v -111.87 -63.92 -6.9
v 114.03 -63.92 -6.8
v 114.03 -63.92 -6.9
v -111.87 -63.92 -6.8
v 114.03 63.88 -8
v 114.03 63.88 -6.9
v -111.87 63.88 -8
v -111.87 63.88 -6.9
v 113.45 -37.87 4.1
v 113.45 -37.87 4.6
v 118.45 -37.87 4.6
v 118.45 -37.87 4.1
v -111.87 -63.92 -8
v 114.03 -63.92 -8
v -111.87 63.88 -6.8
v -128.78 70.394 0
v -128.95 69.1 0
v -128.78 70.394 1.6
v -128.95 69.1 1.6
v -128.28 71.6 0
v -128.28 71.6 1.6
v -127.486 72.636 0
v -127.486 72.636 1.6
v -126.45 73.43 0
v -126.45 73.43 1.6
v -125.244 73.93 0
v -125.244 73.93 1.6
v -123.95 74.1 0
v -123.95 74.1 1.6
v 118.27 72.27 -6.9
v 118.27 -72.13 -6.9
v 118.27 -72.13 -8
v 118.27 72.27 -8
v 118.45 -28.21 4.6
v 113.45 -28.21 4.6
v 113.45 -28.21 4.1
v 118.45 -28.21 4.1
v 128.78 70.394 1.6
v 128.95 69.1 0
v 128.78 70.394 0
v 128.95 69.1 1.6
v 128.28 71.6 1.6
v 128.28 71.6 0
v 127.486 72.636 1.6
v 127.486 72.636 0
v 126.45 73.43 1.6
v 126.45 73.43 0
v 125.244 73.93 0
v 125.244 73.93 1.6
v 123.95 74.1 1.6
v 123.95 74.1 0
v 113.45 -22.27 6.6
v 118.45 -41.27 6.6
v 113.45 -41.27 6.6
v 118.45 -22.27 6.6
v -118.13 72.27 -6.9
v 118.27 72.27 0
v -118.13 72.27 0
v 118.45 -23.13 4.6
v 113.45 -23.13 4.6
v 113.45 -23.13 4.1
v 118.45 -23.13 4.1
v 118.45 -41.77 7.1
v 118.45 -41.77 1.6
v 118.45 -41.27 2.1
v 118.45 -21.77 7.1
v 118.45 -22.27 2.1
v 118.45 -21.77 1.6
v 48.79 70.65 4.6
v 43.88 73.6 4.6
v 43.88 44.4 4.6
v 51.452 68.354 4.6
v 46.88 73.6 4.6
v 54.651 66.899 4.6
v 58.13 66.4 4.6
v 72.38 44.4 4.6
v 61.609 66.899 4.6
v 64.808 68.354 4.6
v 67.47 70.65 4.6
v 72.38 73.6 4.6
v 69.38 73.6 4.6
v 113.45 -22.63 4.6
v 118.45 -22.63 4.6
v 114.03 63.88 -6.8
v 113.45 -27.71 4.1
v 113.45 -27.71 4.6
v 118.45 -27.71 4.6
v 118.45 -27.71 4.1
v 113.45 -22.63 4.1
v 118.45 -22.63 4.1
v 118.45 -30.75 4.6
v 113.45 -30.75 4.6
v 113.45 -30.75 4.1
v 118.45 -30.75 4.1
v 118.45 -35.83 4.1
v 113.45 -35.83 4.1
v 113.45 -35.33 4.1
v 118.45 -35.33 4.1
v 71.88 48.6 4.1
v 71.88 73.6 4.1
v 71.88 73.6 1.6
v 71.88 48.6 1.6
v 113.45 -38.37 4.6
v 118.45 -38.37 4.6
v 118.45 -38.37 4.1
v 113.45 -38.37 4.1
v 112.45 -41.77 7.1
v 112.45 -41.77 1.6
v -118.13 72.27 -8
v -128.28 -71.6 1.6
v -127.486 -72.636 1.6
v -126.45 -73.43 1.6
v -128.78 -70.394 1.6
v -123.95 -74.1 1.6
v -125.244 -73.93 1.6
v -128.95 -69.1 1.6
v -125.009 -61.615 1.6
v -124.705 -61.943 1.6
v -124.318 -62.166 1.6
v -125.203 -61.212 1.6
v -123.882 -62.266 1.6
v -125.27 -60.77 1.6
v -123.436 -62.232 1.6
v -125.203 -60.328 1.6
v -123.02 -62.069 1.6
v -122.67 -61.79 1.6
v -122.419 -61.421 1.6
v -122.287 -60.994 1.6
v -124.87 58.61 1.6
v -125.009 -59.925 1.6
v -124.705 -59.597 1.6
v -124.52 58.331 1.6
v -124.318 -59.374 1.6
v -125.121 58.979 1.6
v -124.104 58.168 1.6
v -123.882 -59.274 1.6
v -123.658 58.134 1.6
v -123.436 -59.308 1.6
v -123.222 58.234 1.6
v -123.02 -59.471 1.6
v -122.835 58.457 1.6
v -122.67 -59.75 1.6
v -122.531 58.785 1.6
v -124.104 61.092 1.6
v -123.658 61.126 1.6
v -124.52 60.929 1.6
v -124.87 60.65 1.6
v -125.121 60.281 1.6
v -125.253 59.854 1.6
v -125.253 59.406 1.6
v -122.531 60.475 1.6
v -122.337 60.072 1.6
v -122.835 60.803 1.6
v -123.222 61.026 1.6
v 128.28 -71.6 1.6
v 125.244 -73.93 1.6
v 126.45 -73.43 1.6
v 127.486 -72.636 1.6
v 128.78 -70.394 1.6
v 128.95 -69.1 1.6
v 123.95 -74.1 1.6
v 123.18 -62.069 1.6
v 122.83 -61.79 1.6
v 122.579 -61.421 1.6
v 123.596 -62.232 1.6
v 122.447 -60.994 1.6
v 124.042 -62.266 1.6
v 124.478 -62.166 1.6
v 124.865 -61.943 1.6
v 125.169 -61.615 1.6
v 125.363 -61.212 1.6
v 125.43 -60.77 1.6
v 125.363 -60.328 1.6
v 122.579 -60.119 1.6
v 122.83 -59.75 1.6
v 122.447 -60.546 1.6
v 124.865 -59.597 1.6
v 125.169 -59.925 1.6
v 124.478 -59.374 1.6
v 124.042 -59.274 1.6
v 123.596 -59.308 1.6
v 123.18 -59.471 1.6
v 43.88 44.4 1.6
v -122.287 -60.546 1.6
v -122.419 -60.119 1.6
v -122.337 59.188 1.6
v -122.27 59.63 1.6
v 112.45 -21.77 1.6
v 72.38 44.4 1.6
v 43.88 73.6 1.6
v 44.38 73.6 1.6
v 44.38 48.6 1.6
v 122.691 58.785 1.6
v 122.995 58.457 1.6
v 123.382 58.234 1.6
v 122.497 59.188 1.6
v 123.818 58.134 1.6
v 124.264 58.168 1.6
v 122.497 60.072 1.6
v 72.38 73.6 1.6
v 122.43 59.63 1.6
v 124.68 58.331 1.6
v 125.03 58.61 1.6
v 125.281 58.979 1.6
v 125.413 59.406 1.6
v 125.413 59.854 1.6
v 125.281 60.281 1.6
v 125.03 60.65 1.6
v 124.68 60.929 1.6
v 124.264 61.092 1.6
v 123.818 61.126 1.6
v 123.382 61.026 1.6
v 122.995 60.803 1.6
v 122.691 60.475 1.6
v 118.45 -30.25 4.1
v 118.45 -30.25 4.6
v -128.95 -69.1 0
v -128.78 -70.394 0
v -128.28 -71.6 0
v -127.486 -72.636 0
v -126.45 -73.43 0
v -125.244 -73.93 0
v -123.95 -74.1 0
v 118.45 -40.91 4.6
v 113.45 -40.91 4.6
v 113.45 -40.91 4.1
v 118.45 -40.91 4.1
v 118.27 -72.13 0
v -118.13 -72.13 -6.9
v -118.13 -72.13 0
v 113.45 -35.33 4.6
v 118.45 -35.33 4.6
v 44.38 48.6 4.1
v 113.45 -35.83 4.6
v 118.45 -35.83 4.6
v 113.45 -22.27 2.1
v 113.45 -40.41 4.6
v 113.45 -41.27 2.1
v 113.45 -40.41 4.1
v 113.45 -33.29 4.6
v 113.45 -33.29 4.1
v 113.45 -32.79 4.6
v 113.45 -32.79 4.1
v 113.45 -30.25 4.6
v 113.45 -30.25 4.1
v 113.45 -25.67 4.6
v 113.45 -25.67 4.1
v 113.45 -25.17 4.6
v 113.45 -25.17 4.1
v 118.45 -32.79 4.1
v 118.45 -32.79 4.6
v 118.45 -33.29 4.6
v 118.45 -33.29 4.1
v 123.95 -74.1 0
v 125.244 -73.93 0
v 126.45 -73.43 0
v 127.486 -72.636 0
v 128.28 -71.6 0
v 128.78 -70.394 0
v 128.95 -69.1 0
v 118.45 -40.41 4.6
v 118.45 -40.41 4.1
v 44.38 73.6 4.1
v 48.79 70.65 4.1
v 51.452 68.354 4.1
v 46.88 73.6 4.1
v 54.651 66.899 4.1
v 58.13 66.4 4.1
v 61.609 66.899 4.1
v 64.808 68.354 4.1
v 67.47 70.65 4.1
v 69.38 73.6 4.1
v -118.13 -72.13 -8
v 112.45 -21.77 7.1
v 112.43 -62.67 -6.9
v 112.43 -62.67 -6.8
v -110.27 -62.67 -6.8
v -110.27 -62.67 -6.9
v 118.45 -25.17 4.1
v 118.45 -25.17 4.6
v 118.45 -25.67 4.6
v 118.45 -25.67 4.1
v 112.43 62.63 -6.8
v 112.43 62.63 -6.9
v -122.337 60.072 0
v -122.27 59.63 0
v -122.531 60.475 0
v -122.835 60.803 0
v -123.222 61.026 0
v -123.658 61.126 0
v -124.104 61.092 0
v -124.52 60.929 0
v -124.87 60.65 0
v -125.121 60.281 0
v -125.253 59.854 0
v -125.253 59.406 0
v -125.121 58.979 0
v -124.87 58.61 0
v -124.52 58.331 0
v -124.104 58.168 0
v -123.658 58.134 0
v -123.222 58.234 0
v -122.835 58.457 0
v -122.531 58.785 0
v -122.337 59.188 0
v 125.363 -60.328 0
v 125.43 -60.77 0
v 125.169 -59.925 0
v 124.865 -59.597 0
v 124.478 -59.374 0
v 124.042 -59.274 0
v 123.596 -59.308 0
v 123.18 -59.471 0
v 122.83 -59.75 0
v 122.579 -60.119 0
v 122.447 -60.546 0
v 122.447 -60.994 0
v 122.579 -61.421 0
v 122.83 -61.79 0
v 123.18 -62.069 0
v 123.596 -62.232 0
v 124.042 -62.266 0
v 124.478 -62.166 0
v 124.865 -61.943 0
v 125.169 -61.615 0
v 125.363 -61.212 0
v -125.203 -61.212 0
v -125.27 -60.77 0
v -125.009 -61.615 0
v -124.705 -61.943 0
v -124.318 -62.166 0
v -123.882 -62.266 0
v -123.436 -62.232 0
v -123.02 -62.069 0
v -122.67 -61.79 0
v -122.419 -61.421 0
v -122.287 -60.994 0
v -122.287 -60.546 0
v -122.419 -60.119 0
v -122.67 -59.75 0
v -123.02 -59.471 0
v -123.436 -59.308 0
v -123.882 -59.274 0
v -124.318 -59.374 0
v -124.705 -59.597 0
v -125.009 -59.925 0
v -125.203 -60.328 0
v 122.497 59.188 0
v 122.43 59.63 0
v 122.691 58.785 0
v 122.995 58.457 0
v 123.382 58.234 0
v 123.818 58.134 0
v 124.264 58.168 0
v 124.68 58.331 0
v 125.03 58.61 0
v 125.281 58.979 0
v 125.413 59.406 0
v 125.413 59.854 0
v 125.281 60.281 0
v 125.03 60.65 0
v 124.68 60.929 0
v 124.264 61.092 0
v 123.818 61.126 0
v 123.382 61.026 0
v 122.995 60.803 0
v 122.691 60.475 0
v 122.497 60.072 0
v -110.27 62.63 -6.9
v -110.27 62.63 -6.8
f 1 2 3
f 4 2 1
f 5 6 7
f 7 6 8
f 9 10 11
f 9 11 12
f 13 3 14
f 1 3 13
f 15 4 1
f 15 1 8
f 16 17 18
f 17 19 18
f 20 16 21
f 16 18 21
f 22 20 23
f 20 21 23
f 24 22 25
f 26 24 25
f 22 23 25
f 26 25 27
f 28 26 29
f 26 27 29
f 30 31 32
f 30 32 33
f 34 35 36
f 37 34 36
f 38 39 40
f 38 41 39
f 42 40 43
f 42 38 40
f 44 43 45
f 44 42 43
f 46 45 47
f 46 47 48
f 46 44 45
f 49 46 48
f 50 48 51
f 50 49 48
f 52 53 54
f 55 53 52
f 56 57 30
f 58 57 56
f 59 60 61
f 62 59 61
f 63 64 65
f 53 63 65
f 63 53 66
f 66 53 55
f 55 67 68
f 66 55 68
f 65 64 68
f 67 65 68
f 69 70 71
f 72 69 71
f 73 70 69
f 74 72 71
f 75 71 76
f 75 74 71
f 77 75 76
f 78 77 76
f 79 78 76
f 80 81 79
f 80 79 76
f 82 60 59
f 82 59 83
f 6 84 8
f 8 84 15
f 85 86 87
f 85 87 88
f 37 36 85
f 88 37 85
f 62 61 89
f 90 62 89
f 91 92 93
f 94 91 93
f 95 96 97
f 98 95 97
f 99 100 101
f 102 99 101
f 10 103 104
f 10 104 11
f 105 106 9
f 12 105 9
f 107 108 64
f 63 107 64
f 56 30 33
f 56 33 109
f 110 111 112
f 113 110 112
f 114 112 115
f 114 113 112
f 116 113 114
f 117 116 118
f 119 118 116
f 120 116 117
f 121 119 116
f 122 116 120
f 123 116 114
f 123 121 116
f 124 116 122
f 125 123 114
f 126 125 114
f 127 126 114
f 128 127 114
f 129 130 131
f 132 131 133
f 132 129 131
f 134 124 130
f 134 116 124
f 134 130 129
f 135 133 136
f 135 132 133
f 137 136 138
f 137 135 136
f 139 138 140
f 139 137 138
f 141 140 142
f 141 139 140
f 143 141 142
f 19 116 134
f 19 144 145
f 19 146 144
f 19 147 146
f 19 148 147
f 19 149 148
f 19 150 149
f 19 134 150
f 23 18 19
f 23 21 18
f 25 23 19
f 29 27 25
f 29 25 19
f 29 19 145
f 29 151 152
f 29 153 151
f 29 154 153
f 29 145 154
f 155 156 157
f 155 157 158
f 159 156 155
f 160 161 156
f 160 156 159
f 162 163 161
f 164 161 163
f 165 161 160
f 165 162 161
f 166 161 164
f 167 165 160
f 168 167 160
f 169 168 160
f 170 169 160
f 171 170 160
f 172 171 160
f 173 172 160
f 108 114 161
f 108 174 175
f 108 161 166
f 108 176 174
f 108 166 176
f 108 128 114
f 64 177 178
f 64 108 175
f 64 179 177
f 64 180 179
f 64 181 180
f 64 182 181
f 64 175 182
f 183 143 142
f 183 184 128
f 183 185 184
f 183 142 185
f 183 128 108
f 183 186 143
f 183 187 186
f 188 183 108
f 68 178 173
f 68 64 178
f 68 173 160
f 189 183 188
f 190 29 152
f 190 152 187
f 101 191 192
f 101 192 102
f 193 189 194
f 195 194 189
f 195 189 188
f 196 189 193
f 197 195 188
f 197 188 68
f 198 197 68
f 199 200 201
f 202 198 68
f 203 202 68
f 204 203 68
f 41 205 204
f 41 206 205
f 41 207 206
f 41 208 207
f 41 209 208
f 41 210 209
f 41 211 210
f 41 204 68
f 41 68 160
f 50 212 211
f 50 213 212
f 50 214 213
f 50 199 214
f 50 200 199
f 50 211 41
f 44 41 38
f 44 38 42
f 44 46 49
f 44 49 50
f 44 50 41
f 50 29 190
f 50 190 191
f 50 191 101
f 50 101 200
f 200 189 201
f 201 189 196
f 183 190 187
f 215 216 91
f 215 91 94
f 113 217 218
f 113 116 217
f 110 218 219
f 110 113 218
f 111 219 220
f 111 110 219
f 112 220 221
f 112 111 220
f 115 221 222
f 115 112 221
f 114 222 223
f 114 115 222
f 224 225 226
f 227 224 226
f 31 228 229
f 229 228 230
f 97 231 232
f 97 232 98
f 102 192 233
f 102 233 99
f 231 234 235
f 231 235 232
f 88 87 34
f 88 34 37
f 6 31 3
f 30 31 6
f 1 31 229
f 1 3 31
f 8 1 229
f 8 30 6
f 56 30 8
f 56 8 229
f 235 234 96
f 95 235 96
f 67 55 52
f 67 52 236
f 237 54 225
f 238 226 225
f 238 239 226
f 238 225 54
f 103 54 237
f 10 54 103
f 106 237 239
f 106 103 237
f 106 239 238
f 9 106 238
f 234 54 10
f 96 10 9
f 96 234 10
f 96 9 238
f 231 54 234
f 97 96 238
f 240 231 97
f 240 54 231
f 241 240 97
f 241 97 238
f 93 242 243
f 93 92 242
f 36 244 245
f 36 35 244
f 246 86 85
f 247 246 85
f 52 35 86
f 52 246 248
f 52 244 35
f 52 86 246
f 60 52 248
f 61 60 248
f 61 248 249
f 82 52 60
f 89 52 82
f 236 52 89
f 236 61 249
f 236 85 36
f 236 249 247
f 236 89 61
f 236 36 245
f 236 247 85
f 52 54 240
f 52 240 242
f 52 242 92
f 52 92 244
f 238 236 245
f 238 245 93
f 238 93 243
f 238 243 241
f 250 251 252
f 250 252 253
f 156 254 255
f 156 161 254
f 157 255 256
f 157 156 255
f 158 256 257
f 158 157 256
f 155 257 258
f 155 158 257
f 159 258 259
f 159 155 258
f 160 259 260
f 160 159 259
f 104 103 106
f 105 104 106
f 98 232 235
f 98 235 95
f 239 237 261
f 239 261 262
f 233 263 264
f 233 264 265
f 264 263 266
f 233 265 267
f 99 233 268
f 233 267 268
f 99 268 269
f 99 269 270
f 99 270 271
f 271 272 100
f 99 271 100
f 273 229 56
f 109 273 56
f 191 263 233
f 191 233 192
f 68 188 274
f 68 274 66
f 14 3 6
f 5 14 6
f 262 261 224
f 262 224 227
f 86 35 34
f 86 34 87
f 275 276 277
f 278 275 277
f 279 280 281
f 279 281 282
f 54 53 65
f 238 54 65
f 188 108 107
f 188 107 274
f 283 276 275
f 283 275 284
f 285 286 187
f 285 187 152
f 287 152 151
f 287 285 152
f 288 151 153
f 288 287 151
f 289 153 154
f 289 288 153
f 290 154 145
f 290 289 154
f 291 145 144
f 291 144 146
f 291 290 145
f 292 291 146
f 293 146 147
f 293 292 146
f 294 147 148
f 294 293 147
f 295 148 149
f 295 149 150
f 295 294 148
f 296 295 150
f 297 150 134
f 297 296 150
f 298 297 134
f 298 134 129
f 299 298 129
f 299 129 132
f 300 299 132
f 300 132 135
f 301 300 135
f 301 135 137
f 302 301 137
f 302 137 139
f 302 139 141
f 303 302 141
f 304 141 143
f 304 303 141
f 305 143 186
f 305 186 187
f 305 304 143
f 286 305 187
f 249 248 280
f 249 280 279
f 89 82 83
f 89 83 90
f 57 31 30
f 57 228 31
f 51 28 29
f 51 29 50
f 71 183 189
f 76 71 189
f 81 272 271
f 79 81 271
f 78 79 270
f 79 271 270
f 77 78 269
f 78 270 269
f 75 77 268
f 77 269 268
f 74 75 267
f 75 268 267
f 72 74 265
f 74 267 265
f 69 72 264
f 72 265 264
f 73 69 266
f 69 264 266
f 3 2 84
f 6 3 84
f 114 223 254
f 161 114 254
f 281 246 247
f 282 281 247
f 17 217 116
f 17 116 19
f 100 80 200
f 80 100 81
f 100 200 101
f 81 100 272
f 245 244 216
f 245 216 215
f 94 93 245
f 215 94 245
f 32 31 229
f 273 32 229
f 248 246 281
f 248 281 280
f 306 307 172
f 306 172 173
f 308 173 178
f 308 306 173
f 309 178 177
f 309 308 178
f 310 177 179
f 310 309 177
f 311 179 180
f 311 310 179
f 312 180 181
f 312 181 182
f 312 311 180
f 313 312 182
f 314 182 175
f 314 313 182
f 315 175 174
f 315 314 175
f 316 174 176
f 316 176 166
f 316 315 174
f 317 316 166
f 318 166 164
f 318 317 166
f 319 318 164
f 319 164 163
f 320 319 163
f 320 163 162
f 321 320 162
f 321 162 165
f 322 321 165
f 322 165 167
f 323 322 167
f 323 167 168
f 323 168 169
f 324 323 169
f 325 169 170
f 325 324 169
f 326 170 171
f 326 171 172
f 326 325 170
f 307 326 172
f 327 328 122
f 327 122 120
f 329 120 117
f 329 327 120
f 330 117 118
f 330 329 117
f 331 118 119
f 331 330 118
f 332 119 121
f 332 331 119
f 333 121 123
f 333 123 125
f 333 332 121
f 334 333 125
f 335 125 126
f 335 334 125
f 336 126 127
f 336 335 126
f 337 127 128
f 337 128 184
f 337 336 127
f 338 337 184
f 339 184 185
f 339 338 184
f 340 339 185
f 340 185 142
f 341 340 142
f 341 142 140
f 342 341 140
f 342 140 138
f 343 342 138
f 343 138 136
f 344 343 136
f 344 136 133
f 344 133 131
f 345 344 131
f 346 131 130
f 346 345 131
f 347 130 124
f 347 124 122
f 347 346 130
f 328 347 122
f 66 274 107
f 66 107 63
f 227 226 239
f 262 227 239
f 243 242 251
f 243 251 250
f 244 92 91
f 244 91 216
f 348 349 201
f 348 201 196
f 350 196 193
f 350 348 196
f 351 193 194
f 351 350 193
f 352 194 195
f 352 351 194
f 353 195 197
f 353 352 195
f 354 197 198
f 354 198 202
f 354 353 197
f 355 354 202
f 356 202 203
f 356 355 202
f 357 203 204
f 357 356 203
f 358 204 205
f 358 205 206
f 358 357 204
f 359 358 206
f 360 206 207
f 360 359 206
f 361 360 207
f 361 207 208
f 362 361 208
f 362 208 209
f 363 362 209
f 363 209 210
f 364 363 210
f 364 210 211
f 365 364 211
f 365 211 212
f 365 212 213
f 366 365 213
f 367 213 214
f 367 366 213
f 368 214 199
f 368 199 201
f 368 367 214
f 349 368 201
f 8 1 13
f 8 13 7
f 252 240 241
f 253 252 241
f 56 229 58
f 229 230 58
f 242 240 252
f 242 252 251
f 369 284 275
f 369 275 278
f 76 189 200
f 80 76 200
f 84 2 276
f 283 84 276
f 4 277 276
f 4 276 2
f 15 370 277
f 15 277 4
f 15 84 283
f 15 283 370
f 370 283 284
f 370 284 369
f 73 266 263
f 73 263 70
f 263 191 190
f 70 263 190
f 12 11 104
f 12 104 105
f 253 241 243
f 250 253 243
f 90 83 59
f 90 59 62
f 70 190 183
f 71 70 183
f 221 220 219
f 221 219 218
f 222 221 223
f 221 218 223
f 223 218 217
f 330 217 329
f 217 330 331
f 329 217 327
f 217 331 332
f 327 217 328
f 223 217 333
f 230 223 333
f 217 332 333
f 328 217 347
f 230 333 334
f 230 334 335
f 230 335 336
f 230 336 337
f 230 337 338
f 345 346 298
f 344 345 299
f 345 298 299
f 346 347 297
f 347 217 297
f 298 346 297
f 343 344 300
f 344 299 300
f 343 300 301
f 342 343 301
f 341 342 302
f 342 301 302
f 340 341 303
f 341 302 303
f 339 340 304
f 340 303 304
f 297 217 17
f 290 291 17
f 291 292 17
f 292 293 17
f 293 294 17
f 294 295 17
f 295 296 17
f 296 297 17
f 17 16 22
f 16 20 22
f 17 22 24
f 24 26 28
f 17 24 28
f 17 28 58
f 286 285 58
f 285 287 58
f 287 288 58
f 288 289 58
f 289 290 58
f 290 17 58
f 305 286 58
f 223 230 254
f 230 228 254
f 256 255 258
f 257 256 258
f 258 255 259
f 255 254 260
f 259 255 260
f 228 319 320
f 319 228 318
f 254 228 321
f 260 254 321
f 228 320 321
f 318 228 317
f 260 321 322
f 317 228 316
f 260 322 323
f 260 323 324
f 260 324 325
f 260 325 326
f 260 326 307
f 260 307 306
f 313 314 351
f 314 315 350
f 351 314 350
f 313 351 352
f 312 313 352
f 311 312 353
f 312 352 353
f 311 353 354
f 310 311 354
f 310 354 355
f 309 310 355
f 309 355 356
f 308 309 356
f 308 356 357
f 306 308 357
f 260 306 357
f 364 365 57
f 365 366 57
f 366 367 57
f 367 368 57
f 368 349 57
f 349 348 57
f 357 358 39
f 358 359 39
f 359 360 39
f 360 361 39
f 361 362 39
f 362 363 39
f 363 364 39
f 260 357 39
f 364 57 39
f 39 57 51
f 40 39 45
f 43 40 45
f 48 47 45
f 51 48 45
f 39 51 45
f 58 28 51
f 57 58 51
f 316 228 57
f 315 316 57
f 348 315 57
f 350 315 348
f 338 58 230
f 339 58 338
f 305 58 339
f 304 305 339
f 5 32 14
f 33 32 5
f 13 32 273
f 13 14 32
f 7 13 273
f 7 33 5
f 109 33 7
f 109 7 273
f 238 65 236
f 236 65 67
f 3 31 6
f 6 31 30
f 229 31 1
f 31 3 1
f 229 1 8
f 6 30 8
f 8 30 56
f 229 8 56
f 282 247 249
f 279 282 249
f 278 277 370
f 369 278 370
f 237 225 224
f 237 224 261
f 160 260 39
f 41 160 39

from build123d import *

# Parameters (mm, degrees)
SKETCH_1_W            = 257.9
SKETCH_1_H            = 148.2
EXTRUDE_1_DEPTH       = 1.6
FILLET_1_R            = 5
SKETCH_2_R            = 1.5
CUT_EXTRUDE_864_DEPTH = 1.6
SKETCH_3_W            = 236.4
SKETCH_3_H            = 144.4
EXTRUDE_1149_DEPTH    = 6.4
SKETCH_4_W            = 236.4
SKETCH_4_H            = 144.4
SKETCH_4_W_2          = 225.9
SKETCH_4_H_2          = 127.8
EXTRUDE_1442_DEPTH    = 0.5
SKETCH_5_W            = 222.7
SKETCH_5_H            = 125.3
EXTRUDE_1729_DEPTH    = 0.5
SKETCH_6_W            = 225.9
SKETCH_6_H            = 127.8
SKETCH_6_W_2          = 222.7
SKETCH_6_H_2          = 125.3
EXTRUDE_2020_DEPTH    = 0.4
SKETCH_7_W            = 6
SKETCH_7_H            = 20
EXTRUDE_4_DEPTH       = 5.5
SKETCH_8_W            = 4.5
SKETCH_8_H            = 19
CUT_EXTRUDE_1_DEPTH   = 5
SKETCH_9_W            = 0.5
SKETCH_9_H            = 0.5
EXTRUDE_5_DEPTH       = 5
EXTRUDE_6_DEPTH       = 3
SKETCH_11_W           = 27.5
SKETCH_11_H           = 2.5
CUT_EXTRUDE_2_DEPTH   = 25
SKETCH_14_W           = 236.4
SKETCH_14_H           = 144.4
SKETCH_14_W_2         = 225.9
SKETCH_14_H_2         = 127.8
EXTRUDE_4115_DEPTH    = 1.1


with BuildPart() as part:
    # 草图1 → 凸台-拉伸1 (new body)
    with BuildSketch(Plane.XY):
        Rectangle(SKETCH_1_W, SKETCH_1_H)
    extrude(amount=EXTRUDE_1_DEPTH)

    # 圆角1
    fillet_1_edges = [part.edges().sort_by_distance(p)[0] for p in [
        (-128.95, 74.1, 0.8),
        (128.95, 74.1, 0.8),
        (128.95, -74.1, 0.8),
        (-128.95, -74.1, 0.8),
    ]]
    fillet(fillet_1_edges, radius=FILLET_1_R)

    # 草图2 → Cut-Extrude 864 (cut)
    with BuildSketch(Plane.XY):
        with Locations((-123.77, 59.63)):
            Circle(SKETCH_2_R)
        with Locations(Location((123.93, 59.63, 0), (0, 0, 180))):
            Circle(SKETCH_2_R)
        with Locations((123.93, -60.77)):
            Circle(SKETCH_2_R)
        with Locations(Location((-123.77, -60.77, 0), (0, 0, 180))):
            Circle(SKETCH_2_R)
    extrude(amount=CUT_EXTRUDE_864_DEPTH, mode=Mode.SUBTRACT)

    # 草图3 → Extrude 1149 (add)
    with BuildSketch(Plane(origin=(0, 0, 0), x_dir=(-1, 0, 0), z_dir=(0, 0, -1))):
        with Locations((-0.07, 0.07)):
            Rectangle(SKETCH_3_W, SKETCH_3_H)
    extrude(amount=EXTRUDE_1149_DEPTH)

    # 草图4 → Extrude 1442 (add)
    with BuildSketch(Plane(origin=(0, 0, -6.4), x_dir=(-1, 0, 0), z_dir=(0, 0, -1))):
        with Locations((-0.07, 0.07)):
            Rectangle(SKETCH_4_W, SKETCH_4_H)
        with Locations((-1.08, -0.02)):
            Rectangle(SKETCH_4_W_2, SKETCH_4_H_2, mode=Mode.SUBTRACT)
    extrude(amount=EXTRUDE_1442_DEPTH)

    # 草图5 → Extrude 1729 (add)
    with BuildSketch(Plane(origin=(0, 0, -6.4), x_dir=(-1, 0, 0), z_dir=(0, 0, -1))):
        with Locations((-1.08, -0.02)):
            Rectangle(SKETCH_5_W, SKETCH_5_H)
    extrude(amount=EXTRUDE_1729_DEPTH)

    # 草图6 → Extrude 2020 (add)
    with BuildSketch(Plane(origin=(0, 0, -6.4), x_dir=(-1, 0, 0), z_dir=(0, 0, -1))):
        with Locations((-1.08, -0.02)):
            Rectangle(SKETCH_6_W, SKETCH_6_H)
        with Locations((-1.08, -0.02)):
            Rectangle(SKETCH_6_W_2, SKETCH_6_H_2, mode=Mode.SUBTRACT)
    extrude(amount=EXTRUDE_2020_DEPTH)

    # 草图7 → 凸台-拉伸4 (add)
    with BuildSketch(Plane.XY.offset(1.6)):
        with Locations((115.45, -31.77)):
            Rectangle(SKETCH_7_W, SKETCH_7_H)
    extrude(amount=EXTRUDE_4_DEPTH)

    # 草图8 → 切除-拉伸1 (cut)
    with BuildSketch(Plane(origin=(118.45, 0, 0), x_dir=(0, 0, -1), z_dir=(1, 0, 0))):
        with Locations((-4.35, -31.77)):
            Rectangle(SKETCH_8_W, SKETCH_8_H)
    extrude(amount=-CUT_EXTRUDE_1_DEPTH, mode=Mode.SUBTRACT)

    # 草图9 → 凸台-拉伸5 (add)
    with BuildSketch(Plane(origin=(113.45, 0, 0), x_dir=(0, 0, -1), z_dir=(1, 0, 0))):
        with Locations((-4.35, -30.5)):
            Rectangle(SKETCH_9_W, SKETCH_9_H)
        with Locations((-4.35, -27.96)):
            Rectangle(SKETCH_9_W, SKETCH_9_H)
        with Locations((-4.35, -25.42)):
            Rectangle(SKETCH_9_W, SKETCH_9_H)
        with Locations((-4.35, -22.88)):
            Rectangle(SKETCH_9_W, SKETCH_9_H)
        with Locations((-4.35, -40.66)):
            Rectangle(SKETCH_9_W, SKETCH_9_H)
        with Locations((-4.35, -38.12)):
            Rectangle(SKETCH_9_W, SKETCH_9_H)
        with Locations((-4.35, -35.58)):
            Rectangle(SKETCH_9_W, SKETCH_9_H)
        with Locations((-4.35, -33.04)):
            Rectangle(SKETCH_9_W, SKETCH_9_H)
    extrude(amount=EXTRUDE_5_DEPTH)

    # 草图10 → 凸台-拉伸6 (add)
    with BuildSketch(Plane.XY.offset(1.6)):
        with BuildLine():
            Line((46.88, 73.6), (43.88, 73.6))
            Line((43.88, 73.6), (43.88, 44.4))
            Line((43.88, 44.4), (72.38, 44.4))
            Line((72.38, 44.4), (72.38, 73.6))
            Line((72.38, 73.6), (69.38, 73.6))
            ThreePointArc((69.38, 73.6), (58.13, 66.4), (46.88, 73.6))
        make_face()
    extrude(amount=EXTRUDE_6_DEPTH)

    # 草图11 → 切除-拉伸2 (cut)
    with BuildSketch(Plane(origin=(0, 73.6, 0), x_dir=(1, 0, 0), z_dir=(0, 1, 0))):
        with Locations((58.13, -2.85)):
            Rectangle(SKETCH_11_W, SKETCH_11_H)
    extrude(amount=-CUT_EXTRUDE_2_DEPTH, mode=Mode.SUBTRACT)


with BuildPart() as body_2:
    # 草图14 → Extrude 4115 (new body)
    with BuildSketch(Plane(origin=(0, 0, -6.9), x_dir=(-1, 0, 0), z_dir=(0, 0, -1))):
        with Locations((-0.07, 0.07)):
            Rectangle(SKETCH_14_W, SKETCH_14_H)
        with Locations((-1.08, -0.02)):
            Rectangle(SKETCH_14_W_2, SKETCH_14_H_2, mode=Mode.SUBTRACT)
    extrude(amount=EXTRUDE_4115_DEPTH)


solid = Compound([part.part, body_2.part])
